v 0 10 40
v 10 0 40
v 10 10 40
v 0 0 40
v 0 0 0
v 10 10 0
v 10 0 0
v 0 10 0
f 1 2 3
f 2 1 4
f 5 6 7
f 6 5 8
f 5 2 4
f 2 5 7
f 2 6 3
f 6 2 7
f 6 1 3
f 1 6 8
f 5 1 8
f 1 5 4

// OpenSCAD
module remove_cube() {
    cube(size=[10, 10, 40]);
}

// call module when run directly
remove_cube();
